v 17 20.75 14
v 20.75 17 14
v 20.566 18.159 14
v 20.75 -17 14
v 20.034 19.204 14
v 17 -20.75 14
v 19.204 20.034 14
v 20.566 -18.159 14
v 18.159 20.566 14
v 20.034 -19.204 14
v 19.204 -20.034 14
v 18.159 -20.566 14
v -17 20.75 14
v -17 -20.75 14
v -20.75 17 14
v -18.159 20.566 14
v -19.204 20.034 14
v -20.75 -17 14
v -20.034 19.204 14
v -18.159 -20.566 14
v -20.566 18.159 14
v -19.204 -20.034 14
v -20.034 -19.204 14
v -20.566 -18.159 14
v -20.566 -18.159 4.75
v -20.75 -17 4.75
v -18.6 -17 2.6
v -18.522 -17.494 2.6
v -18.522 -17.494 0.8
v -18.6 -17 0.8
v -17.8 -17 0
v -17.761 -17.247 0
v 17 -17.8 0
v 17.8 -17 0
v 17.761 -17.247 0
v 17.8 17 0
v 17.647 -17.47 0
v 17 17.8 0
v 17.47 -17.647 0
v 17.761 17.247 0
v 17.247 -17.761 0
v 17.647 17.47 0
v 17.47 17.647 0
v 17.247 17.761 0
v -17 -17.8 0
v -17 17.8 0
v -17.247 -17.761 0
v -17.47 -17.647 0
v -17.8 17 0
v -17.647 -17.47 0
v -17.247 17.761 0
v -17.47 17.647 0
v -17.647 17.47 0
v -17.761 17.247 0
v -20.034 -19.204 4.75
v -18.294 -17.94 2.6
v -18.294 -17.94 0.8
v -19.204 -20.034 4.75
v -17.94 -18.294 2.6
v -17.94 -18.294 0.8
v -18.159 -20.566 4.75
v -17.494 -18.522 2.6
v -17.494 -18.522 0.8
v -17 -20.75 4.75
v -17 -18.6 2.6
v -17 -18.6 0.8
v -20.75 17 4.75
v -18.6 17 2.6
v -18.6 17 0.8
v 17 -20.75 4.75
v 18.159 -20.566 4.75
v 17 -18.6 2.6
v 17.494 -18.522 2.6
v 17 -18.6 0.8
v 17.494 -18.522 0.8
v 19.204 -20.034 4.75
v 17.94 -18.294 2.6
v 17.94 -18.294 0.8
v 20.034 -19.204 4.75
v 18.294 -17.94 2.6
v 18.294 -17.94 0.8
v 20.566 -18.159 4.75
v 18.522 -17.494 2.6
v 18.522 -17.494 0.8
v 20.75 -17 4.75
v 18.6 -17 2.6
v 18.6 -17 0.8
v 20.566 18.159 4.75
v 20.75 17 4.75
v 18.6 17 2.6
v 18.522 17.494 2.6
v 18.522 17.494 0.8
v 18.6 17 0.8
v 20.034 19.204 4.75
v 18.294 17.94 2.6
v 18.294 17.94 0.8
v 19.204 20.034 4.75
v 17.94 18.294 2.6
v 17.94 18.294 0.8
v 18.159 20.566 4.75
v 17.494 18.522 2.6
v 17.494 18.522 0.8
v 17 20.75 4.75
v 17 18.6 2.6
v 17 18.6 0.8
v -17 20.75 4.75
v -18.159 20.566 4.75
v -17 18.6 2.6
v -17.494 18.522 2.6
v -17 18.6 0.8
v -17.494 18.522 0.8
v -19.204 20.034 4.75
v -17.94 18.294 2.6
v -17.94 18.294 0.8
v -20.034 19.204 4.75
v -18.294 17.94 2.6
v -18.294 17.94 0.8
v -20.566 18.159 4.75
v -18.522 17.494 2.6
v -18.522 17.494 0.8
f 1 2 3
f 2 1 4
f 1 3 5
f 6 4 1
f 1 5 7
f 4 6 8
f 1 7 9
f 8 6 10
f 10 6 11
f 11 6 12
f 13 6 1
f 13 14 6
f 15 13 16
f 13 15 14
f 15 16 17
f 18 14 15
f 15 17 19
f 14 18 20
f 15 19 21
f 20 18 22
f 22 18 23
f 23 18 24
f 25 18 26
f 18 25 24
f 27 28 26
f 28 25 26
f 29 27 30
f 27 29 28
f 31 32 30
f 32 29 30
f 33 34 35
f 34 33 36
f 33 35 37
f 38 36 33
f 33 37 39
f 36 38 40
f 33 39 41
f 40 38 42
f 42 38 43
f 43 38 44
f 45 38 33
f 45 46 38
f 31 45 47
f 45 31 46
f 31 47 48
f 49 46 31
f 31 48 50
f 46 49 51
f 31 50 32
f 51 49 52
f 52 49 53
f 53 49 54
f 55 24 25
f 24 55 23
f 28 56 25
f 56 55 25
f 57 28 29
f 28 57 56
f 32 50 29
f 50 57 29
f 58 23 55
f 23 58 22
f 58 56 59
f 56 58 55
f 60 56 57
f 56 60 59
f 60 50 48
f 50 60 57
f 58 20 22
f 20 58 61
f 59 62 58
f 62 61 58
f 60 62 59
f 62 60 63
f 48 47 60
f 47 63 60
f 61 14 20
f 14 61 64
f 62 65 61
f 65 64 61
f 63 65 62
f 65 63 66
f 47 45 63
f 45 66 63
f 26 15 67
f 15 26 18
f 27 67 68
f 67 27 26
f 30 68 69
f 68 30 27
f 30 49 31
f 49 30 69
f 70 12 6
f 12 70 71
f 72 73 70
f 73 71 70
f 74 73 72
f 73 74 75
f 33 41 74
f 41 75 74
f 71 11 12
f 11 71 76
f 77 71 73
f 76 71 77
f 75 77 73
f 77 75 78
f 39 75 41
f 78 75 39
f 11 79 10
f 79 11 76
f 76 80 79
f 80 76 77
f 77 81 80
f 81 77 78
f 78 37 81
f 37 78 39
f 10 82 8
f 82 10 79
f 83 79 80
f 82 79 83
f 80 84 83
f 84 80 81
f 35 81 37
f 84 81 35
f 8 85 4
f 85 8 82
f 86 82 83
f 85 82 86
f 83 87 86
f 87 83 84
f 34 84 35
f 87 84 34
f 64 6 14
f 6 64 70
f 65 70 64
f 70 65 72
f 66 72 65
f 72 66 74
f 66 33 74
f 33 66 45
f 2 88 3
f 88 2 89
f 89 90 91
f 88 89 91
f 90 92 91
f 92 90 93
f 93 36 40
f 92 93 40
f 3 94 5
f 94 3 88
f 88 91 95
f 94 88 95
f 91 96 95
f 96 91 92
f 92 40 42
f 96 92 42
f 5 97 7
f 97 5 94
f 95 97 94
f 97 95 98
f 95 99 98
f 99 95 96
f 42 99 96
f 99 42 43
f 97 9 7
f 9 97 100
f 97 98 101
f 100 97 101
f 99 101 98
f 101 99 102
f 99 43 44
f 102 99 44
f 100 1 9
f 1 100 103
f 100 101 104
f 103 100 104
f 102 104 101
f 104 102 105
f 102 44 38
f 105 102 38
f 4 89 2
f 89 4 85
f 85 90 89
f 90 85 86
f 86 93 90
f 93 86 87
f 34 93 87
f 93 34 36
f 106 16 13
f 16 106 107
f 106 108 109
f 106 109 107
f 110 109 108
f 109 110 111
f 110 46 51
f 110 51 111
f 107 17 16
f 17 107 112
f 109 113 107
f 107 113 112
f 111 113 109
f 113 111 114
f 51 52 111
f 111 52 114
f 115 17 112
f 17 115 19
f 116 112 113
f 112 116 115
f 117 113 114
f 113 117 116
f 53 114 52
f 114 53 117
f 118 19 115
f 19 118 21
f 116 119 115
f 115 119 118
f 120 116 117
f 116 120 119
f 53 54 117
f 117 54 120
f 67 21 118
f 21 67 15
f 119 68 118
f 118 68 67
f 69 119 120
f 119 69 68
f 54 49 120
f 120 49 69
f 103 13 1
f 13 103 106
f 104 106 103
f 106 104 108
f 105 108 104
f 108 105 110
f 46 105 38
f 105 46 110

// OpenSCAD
// file: GridfinityLib.scad
/* Edge profile point arrays!
 *
 * Should be listed from bottom to top.
 * - X=0 is at the edge of the cell (*not the slightly narrower block*)
 * - Positive X is the offset into the left side
 * - Y=0 is the floor.
 * - Corner profile point lists start with the base
 *   and go upwards to the side.
 */

// Regular block bottom
tog_gridfinity_block_bottom_corner_profile_points = [
	[3.20, 0.00], // Right end of bottom bevel
	[2.40, 0.80],
	[2.40, 2.60],
	[0.25, 4.75], // Top of left bevel
];

// Block lip, with min(X) = 0.25
tog_gridfinity_block_lip_corner_profile_points = [
	[2.85, 0.00], // Right end of bottom bevel
	[2.15, 0.70],
	[2.15, 2.50],
	[0.25, 4.20], // Top tip
];

// Full-cell lip.   Starts at cell edge instead of 0.25 inward for blocks.
// Alternatively one could always use this and just intersect with the block hull,
// (or subtracting the inverse)
// which may be simpler especially if making blocks with a grid on top.
tog_gridfinity_full_lip_corner_profile_points = [
	[2.85, 0.00], // Right end of bottom bevel
	[2.15, 0.70],
	[2.15, 2.50],
	[0.00, 4.65], // Top tip
];

function tog_gridfinity_make_corner_extrudable_points(corner_profile_points, margin, block_height=7, corner_radius=4) = [
	[0, 0],
	for( point=corner_profile_points ) [point[0] - corner_radius, point[1]],
	[margin - corner_radius, block_height],
	[0, block_height],
];

function tog_gridfinity_reverse_list(list) = [
	for( i=[len(list)-1: -1 : 0] ) list[i]
];

/**
 * Reverses the list of points for use as a cutout at the top of a block
 * and also adds some amount of Y
 */
//function tog_gridfinity_adjusted_lip_points(point_list, delta_y=0) = [
//	for( i=[len(list)-1: -1 : 0] ) list[i]
//];

// Extrudable points for an entire block, with lip, filled to the specified height
function tog_gridfinity_make_block_with_lip_extrudable_points( block_height, floor_height=7, corner_radius=4, wall_thickness=2 ) = [
	[0, 0],
	for( point=tog_gridfinity_block_bottom_corner_profile_points ) [point[0] - corner_radius, point[1]],
	for( point=tog_gridfinity_reverse_list(tog_gridfinity_block_lip_corner_profile_points) ) [point[0] - corner_radius, point[1] + block_height],
	each (floor_height == block_height ? [] : [
		// TODO: Really want to filter this list of down-the-inside-of-the-lip points
		// based on being >= floor height.
		[tog_gridfinity_block_lip_corner_profile_points[0][0] - corner_radius, max(floor_height, block_height-2)], // 2 is probably fine; really want a max. 45deg from wall thickness to innermost point in lip
		[wall_thickness+0.25 - corner_radius, max(floor_height, block_height-4)], // difference y=-2 is probably fine; really want a max. 45deg from wall thickness to innermost point in lip
		[wall_thickness+0.25 - corner_radius, floor_height],
	]),
	[0, floor_height],,
	//[tog_gridfinity_block_lip_corner_profile_points[0][0] - corner_radius, floor_height],
];

// Create full extrudable polygon where x=0 refers to the pivot point
function tog_gridfinity_make_block_bottom_corner_extrudable_points(block_height=7, corner_radius=4) = tog_gridfinity_make_corner_extrudable_points(
	tog_gridfinity_block_bottom_corner_profile_points,
	0.25,
	block_height=block_height,
	corner_radius=corner_radius
);

module tog_gridfinity_block_from_profile_points(profile_points, block_width=42, corner_radius=4, overlap=0) {
	bottom_z = profile_points[0][1];
	top_z    = profile_points[len(profile_points)-1][1];
	for( r=[0:90:270] ) rotate([0,0,r]) {
		translate([-block_width/2+corner_radius, -block_width/2+corner_radius, 0]) {
			rotate_extrude(angle=90) {
				polygon(profile_points);
			}
		}
		translate([-block_width/2+corner_radius, 0, 0]) {
			rotate([90,0,0]) linear_extrude(block_width-2*corner_radius+overlap*2, center=true) {
				polygon(profile_points);
			}
		}
	}
	translate([0,0,(bottom_z+top_z)/2]) cube([block_width-corner_radius*2+overlap*2, block_width-corner_radius*2+overlap*2, top_z-bottom_z], center=true);
}


/**
 * Hull to be intersected with block bottoms for gridfinity compatibility.
 * Overlap=0 seems to work, but it can be set to a small value, like 1/64,
 * if OpenSCAD gets confused about exactly interfacing surfaces.
 */
module tog_gridfinity_block_bottom(height=14, gridfinity_pitch=42, corner_radius=4, overlap=0) {
	tog_gridfinity_block_from_profile_points(tog_gridfinity_make_block_bottom_corner_extrudable_points(height, corner_radius), gridfinity_pitch, corner_radius, overlap);
}

module tog_gridfinity_block_with_lip(
	height=14, floor_height=7,
	gridfinity_pitch=42, corner_radius=4, overlap=0,
	magnet_hole_diameter=6.5,
	magnet_hole_depth=2.4,
) {
	difference() {
		tog_gridfinity_block_from_profile_points(tog_gridfinity_make_block_with_lip_extrudable_points(height, floor_height, corner_radius), gridfinity_pitch, corner_radius, overlap);
		if( magnet_hole_diameter > 0 && magnet_hole_depth > 0 ) for( ym=[-1,1] ) for( xm=[-1,1] ) {
			translate([13*xm, 13*ym, 0]) cylinder(d=magnet_hole_diameter, h=magnet_hole_depth, center=true);
		}
	}
}
// main file
$fn = 20;

include <GridfinityLib.scad>

tog_gridfinity_block_bottom(14, 42, 4);
